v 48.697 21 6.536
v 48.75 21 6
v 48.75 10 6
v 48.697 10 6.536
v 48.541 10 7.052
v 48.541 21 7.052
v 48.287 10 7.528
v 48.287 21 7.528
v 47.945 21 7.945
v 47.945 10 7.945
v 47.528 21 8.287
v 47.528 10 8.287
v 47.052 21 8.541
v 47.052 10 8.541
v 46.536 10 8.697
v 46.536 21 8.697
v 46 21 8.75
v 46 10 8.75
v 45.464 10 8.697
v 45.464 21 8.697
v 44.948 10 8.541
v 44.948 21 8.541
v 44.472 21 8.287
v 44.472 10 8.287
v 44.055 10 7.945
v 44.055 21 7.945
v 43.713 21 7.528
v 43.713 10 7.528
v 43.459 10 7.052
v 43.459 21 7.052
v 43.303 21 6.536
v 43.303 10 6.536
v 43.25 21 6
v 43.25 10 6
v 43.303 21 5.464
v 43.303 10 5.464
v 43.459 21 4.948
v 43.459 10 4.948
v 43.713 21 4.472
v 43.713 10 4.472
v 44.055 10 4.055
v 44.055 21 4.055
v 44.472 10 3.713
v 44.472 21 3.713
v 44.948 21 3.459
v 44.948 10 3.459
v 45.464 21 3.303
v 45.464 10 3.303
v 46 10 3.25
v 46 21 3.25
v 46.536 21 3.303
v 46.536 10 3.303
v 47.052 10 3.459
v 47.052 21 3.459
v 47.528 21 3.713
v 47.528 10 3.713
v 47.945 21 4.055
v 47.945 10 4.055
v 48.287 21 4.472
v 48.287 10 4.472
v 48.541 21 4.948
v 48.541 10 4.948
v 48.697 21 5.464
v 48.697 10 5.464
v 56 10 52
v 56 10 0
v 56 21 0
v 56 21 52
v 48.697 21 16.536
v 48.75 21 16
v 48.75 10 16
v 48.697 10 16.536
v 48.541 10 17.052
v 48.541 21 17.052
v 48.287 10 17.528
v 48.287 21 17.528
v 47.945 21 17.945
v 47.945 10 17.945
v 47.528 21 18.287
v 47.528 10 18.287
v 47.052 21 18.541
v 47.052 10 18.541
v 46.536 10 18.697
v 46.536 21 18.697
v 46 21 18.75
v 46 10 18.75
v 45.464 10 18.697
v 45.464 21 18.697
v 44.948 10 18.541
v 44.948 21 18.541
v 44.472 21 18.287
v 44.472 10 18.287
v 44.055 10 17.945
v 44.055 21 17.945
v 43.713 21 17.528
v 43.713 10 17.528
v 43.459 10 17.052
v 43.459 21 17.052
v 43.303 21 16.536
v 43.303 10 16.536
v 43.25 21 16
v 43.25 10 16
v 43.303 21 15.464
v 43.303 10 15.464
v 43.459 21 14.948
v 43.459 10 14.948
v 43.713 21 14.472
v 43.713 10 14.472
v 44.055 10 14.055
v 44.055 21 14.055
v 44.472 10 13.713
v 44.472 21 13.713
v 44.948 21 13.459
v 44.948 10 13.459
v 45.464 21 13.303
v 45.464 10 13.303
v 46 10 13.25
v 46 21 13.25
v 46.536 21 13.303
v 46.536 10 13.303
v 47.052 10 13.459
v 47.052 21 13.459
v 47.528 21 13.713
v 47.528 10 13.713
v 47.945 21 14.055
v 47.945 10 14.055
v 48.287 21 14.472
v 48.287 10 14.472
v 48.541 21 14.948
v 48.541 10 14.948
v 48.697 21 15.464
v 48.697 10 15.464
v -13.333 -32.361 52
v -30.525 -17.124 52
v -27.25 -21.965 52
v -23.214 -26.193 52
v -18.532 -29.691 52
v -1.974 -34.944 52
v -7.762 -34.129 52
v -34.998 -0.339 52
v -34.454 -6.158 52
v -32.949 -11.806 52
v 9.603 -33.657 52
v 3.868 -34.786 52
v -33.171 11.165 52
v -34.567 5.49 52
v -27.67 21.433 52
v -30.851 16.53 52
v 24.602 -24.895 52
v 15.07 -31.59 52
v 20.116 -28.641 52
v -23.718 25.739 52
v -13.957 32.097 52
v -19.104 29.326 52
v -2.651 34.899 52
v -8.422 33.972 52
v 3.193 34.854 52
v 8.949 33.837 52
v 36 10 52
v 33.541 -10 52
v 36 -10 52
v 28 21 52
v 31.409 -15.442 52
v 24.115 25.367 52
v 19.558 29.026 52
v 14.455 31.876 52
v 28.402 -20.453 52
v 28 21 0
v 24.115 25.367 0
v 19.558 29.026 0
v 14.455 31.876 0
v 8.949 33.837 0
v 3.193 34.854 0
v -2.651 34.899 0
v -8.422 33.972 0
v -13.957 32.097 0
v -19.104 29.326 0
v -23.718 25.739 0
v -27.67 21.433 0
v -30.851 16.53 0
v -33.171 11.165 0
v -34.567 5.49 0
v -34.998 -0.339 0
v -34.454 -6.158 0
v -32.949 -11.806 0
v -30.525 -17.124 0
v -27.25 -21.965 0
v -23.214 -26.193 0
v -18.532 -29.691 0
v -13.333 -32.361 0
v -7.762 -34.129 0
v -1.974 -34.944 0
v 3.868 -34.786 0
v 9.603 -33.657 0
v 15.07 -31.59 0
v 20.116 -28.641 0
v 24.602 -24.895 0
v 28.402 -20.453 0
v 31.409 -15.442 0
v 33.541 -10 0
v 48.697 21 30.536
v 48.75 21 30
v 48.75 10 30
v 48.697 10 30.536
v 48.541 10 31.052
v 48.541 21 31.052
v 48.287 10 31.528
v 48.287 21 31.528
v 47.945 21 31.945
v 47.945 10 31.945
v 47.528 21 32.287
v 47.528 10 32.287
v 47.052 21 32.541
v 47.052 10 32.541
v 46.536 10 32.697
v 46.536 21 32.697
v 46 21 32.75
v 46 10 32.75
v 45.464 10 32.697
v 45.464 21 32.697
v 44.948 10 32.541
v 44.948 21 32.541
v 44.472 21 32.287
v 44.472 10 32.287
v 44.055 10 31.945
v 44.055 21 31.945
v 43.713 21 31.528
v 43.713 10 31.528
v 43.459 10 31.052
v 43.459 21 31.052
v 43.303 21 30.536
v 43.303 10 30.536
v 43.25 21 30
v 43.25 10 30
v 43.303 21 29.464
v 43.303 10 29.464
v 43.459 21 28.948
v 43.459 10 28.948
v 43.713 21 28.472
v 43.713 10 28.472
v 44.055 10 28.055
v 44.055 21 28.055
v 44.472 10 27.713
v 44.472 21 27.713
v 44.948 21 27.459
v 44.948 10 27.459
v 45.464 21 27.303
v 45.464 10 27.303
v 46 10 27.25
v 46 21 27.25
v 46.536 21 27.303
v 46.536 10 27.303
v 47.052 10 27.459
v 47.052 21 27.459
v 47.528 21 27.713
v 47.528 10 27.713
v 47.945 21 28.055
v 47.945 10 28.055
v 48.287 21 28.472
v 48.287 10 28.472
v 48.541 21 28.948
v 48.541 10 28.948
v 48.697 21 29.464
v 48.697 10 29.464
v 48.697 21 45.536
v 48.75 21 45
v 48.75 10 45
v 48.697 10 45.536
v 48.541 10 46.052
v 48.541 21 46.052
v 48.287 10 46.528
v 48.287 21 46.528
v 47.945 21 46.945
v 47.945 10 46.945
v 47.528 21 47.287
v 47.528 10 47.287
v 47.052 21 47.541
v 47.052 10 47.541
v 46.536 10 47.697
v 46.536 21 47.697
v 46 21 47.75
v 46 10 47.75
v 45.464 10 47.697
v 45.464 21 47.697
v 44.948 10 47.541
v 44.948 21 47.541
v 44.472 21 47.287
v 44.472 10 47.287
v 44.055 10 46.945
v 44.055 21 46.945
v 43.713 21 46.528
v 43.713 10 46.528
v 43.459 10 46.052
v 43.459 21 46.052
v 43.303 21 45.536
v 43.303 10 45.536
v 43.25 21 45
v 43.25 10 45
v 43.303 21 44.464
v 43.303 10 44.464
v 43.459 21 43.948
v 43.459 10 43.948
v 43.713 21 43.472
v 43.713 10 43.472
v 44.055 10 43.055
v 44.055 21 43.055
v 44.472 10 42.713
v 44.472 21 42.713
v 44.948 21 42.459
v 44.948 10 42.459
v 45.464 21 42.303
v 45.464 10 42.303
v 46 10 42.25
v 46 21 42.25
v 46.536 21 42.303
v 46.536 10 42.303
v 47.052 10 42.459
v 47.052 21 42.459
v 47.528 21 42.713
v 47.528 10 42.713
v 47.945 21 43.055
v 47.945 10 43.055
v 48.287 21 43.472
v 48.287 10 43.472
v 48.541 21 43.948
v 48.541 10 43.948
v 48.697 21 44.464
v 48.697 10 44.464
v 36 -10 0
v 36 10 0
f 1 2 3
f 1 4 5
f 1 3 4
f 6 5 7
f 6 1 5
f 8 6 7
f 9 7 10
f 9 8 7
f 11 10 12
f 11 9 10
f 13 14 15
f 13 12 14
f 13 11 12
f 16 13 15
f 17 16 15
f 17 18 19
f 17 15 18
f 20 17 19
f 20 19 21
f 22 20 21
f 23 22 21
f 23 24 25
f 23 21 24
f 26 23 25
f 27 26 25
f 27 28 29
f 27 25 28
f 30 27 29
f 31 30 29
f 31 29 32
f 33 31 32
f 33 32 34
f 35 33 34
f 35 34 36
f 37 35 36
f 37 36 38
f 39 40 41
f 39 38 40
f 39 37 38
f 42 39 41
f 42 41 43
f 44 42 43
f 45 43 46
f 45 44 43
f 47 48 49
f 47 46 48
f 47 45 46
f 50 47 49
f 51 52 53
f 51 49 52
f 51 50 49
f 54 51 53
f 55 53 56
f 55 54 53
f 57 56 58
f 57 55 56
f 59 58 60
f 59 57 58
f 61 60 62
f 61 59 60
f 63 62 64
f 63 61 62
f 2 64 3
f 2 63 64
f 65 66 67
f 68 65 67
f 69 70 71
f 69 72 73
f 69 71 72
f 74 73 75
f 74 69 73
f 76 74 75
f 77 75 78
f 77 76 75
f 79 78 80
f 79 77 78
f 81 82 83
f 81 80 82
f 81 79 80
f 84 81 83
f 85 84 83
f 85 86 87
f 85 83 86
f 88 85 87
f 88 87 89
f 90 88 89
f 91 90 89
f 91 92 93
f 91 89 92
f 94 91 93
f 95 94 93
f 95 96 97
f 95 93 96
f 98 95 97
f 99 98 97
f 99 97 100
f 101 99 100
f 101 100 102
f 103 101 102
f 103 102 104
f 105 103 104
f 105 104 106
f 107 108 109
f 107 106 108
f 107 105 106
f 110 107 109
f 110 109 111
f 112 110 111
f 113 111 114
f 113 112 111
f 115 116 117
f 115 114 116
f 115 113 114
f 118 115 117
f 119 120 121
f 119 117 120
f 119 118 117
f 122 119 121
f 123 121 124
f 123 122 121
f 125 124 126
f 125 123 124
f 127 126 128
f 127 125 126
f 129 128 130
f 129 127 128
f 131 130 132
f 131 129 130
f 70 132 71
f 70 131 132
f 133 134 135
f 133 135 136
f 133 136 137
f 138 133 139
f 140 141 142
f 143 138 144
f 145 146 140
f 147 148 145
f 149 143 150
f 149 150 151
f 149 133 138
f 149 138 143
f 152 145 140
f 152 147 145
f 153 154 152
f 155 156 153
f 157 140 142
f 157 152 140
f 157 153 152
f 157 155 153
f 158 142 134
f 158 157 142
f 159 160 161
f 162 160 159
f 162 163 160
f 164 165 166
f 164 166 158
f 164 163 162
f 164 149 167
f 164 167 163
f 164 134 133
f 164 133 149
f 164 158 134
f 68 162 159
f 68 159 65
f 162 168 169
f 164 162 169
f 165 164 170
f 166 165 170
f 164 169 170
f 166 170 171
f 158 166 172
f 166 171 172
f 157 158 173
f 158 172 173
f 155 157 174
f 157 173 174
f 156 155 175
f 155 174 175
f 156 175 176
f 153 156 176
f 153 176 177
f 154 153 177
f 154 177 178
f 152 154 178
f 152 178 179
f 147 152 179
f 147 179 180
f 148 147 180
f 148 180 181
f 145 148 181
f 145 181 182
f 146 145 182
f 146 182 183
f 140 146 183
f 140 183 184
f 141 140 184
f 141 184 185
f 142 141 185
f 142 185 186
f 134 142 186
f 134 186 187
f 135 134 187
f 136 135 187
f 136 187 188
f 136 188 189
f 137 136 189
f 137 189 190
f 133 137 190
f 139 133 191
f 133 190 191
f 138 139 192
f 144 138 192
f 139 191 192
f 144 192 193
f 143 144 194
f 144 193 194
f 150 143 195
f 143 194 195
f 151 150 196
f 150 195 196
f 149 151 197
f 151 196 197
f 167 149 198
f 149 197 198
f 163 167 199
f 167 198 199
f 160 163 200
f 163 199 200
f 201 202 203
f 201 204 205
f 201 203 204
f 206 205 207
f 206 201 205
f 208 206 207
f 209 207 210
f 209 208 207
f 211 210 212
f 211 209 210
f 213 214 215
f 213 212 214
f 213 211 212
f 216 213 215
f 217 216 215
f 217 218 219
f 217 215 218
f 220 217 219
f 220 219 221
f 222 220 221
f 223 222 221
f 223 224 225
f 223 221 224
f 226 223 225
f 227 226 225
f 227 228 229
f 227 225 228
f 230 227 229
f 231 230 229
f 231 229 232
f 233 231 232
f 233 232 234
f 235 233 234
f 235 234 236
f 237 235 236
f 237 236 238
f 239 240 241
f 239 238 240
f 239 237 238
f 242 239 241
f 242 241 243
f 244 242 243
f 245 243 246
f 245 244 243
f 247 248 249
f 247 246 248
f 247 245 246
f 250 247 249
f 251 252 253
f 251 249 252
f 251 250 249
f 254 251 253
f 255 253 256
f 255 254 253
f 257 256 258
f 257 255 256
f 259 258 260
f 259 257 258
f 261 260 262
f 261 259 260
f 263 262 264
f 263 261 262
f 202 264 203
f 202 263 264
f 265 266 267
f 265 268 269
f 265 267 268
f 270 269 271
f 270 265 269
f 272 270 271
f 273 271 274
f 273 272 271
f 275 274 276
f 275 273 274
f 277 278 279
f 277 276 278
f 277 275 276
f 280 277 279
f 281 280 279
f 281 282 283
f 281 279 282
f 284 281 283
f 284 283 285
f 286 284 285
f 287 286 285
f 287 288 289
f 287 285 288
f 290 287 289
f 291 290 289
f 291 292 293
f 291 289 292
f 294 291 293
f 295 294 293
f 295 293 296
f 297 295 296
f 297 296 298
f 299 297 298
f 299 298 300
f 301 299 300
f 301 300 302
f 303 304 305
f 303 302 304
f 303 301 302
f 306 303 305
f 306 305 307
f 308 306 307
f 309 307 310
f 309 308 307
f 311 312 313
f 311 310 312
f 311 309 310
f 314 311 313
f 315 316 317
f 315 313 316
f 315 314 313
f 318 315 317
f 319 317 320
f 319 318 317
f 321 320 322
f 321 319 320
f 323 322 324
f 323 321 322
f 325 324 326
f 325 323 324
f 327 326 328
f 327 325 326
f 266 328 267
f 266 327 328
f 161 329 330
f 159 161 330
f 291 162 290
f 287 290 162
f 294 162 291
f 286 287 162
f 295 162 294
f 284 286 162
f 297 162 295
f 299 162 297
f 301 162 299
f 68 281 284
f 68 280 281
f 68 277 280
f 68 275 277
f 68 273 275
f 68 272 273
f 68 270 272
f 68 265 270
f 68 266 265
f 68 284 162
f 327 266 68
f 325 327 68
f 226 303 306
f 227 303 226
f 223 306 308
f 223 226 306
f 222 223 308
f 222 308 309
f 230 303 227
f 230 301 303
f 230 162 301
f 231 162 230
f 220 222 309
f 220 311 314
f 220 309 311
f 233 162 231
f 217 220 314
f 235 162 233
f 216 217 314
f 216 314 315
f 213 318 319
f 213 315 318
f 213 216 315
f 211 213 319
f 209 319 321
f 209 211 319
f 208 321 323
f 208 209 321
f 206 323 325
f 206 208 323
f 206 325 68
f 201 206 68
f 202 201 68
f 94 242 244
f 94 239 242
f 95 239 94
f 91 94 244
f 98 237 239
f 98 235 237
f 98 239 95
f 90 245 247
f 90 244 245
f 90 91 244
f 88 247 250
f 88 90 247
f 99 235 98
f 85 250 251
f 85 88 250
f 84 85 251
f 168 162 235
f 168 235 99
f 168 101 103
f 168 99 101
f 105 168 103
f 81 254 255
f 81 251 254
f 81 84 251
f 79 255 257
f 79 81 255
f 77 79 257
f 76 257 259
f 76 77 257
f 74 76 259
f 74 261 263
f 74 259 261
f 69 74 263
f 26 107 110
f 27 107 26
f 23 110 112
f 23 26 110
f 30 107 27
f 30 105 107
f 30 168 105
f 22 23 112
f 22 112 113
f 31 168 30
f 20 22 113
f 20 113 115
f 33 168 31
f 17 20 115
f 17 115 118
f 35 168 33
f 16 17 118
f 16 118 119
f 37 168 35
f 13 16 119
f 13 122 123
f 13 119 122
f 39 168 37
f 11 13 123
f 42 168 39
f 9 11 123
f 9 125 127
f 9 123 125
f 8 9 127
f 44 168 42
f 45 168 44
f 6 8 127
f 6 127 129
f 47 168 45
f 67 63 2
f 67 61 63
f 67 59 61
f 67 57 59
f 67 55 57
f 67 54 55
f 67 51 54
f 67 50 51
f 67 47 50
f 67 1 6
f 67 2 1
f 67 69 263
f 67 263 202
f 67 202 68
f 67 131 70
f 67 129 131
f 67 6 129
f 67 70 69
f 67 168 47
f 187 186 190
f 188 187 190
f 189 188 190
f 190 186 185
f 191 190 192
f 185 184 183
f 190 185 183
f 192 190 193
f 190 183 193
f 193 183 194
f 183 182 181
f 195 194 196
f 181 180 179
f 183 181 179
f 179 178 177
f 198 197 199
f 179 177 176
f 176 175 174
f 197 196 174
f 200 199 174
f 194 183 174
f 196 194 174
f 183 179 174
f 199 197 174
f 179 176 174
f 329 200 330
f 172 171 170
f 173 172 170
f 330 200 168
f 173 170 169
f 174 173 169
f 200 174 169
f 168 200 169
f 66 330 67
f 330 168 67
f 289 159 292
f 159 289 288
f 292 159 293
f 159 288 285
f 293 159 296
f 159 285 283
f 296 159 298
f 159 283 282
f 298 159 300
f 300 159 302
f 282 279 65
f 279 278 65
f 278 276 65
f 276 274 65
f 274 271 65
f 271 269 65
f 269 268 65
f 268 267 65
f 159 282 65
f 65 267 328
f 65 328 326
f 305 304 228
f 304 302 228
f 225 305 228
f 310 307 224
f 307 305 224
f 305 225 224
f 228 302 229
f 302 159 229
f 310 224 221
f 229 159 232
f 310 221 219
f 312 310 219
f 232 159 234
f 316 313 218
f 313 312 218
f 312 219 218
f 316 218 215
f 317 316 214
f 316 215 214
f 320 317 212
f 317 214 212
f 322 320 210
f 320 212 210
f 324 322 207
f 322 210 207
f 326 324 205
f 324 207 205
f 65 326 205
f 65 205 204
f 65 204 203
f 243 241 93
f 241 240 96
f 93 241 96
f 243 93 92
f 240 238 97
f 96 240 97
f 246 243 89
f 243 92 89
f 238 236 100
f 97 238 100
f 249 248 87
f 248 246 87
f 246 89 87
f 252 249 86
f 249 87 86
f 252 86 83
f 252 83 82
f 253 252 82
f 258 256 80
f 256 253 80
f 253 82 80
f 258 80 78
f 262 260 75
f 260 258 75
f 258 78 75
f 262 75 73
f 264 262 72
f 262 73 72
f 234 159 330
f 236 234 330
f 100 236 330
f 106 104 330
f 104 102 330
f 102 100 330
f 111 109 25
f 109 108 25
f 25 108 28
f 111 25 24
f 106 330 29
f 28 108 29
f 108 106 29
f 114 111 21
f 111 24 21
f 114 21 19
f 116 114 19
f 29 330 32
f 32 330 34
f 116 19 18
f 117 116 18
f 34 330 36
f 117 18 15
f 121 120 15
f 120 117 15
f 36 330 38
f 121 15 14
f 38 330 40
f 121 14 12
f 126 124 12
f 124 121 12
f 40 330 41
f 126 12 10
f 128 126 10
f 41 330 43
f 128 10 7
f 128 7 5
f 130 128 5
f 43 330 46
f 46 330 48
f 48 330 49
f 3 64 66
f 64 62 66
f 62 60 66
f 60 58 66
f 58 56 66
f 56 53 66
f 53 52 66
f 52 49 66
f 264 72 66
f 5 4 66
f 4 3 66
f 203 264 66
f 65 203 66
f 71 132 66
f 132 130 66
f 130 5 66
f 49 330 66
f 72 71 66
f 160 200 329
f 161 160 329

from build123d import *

# Parameters (mm, degrees)
CYLINDER001_R          = 2.75
CYLINDER001_DEPTH      = 15
CYLINDER001_ROLL_ANGLE = 90
CYLINDER002_R          = 2.75
CYLINDER002_DEPTH      = 15
CYLINDER002_ROLL_ANGLE = 90
CYLINDER003_R          = 2.75
CYLINDER003_DEPTH      = 15
CYLINDER003_ROLL_ANGLE = 90
CYLINDER_R             = 2.75
CYLINDER_DEPTH         = 15
CYLINDER_ROLL_ANGLE    = 90
BOX_W                  = 20
BOX_H                  = 11
BOX_DEPTH              = 52
BOX001_W               = 10
BOX001_H               = 31
BOX001_DEPTH           = 52
CYLINDER004_R          = 35
CYLINDER004_DEPTH      = 52


with BuildPart() as cylinder001:
    # Cylinder001 → Cylinder001 (new body)
    with BuildSketch(Plane.XY):
        Circle(CYLINDER001_R)
    extrude(amount=CYLINDER001_DEPTH)


with BuildPart() as cylinder001_1:
    # Cylinder001 roll: moved
    add(cylinder001.part.rotate(Axis((0, 0, 0), (1, 0, 0)), CYLINDER001_ROLL_ANGLE))


with BuildPart() as cylinder001_2:
    # Cylinder001 placement: moved
    add(cylinder001_1.part.moved(Location((46, 23, 6))))


with BuildPart() as cylinder002:
    # Cylinder002 → Cylinder002 (new body)
    with BuildSketch(Plane.XY):
        Circle(CYLINDER002_R)
    extrude(amount=CYLINDER002_DEPTH)


with BuildPart() as cylinder002_1:
    # Cylinder002 roll: moved
    add(cylinder002.part.rotate(Axis((0, 0, 0), (1, 0, 0)), CYLINDER002_ROLL_ANGLE))


with BuildPart() as cylinder002_2:
    # Cylinder002 placement: moved
    add(cylinder002_1.part.moved(Location((46, 23, 16))))


with BuildPart() as cylinder003:
    # Cylinder003 → Cylinder003 (new body)
    with BuildSketch(Plane.XY):
        Circle(CYLINDER003_R)
    extrude(amount=CYLINDER003_DEPTH)


with BuildPart() as cylinder003_1:
    # Cylinder003 roll: moved
    add(cylinder003.part.rotate(Axis((0, 0, 0), (1, 0, 0)), CYLINDER003_ROLL_ANGLE))


with BuildPart() as cylinder003_2:
    # Cylinder003 placement: moved
    add(cylinder003_1.part.moved(Location((46, 23, 45))))


with BuildPart() as negative_fusion:
    # Cylinder → Cylinder (new body)
    with BuildSketch(Plane.XY):
        Circle(CYLINDER_R)
    extrude(amount=CYLINDER_DEPTH)


with BuildPart() as negative_fusion_1:
    # Cylinder roll: moved
    add(negative_fusion.part.rotate(Axis((0, 0, 0), (1, 0, 0)), CYLINDER_ROLL_ANGLE))


with BuildPart() as negative_fusion_2:
    # Cylinder placement: moved
    add(negative_fusion_1.part.moved(Location((46, 23, 30))))

    # Fusion: union Cylinder001, Cylinder002, Cylinder003
    add(cylinder001_2.part)
    add(cylinder002_2.part)
    add(cylinder003_2.part)


with BuildPart() as cube:
    # Box → Box (new body)
    with BuildSketch(Plane(origin=(36, 10, 0), x_dir=(1, 0, 0), z_dir=(0, 0, 1))):
        with Locations((10, 5.5)):
            Rectangle(BOX_W, BOX_H)
    extrude(amount=BOX_DEPTH)


with BuildPart() as cube001:
    # Box001 → Box001 (new body)
    with BuildSketch(Plane(origin=(26, -10, 0), x_dir=(1, 0, 0), z_dir=(0, 0, 1))):
        with Locations((5, 15.5)):
            Rectangle(BOX001_W, BOX001_H)
    extrude(amount=BOX001_DEPTH)


with BuildPart() as cut:
    # Cylinder004 → Cylinder004 (new body)
    with BuildSketch(Plane.XY):
        Circle(CYLINDER004_R)
    extrude(amount=CYLINDER004_DEPTH)

    # Fusion001: union Cube, Cube001
    add(cube.part)
    add(cube001.part)

    # Cut: cut Negative Fusion
    add(negative_fusion_2.part, mode=Mode.SUBTRACT)


solid = cut.part
